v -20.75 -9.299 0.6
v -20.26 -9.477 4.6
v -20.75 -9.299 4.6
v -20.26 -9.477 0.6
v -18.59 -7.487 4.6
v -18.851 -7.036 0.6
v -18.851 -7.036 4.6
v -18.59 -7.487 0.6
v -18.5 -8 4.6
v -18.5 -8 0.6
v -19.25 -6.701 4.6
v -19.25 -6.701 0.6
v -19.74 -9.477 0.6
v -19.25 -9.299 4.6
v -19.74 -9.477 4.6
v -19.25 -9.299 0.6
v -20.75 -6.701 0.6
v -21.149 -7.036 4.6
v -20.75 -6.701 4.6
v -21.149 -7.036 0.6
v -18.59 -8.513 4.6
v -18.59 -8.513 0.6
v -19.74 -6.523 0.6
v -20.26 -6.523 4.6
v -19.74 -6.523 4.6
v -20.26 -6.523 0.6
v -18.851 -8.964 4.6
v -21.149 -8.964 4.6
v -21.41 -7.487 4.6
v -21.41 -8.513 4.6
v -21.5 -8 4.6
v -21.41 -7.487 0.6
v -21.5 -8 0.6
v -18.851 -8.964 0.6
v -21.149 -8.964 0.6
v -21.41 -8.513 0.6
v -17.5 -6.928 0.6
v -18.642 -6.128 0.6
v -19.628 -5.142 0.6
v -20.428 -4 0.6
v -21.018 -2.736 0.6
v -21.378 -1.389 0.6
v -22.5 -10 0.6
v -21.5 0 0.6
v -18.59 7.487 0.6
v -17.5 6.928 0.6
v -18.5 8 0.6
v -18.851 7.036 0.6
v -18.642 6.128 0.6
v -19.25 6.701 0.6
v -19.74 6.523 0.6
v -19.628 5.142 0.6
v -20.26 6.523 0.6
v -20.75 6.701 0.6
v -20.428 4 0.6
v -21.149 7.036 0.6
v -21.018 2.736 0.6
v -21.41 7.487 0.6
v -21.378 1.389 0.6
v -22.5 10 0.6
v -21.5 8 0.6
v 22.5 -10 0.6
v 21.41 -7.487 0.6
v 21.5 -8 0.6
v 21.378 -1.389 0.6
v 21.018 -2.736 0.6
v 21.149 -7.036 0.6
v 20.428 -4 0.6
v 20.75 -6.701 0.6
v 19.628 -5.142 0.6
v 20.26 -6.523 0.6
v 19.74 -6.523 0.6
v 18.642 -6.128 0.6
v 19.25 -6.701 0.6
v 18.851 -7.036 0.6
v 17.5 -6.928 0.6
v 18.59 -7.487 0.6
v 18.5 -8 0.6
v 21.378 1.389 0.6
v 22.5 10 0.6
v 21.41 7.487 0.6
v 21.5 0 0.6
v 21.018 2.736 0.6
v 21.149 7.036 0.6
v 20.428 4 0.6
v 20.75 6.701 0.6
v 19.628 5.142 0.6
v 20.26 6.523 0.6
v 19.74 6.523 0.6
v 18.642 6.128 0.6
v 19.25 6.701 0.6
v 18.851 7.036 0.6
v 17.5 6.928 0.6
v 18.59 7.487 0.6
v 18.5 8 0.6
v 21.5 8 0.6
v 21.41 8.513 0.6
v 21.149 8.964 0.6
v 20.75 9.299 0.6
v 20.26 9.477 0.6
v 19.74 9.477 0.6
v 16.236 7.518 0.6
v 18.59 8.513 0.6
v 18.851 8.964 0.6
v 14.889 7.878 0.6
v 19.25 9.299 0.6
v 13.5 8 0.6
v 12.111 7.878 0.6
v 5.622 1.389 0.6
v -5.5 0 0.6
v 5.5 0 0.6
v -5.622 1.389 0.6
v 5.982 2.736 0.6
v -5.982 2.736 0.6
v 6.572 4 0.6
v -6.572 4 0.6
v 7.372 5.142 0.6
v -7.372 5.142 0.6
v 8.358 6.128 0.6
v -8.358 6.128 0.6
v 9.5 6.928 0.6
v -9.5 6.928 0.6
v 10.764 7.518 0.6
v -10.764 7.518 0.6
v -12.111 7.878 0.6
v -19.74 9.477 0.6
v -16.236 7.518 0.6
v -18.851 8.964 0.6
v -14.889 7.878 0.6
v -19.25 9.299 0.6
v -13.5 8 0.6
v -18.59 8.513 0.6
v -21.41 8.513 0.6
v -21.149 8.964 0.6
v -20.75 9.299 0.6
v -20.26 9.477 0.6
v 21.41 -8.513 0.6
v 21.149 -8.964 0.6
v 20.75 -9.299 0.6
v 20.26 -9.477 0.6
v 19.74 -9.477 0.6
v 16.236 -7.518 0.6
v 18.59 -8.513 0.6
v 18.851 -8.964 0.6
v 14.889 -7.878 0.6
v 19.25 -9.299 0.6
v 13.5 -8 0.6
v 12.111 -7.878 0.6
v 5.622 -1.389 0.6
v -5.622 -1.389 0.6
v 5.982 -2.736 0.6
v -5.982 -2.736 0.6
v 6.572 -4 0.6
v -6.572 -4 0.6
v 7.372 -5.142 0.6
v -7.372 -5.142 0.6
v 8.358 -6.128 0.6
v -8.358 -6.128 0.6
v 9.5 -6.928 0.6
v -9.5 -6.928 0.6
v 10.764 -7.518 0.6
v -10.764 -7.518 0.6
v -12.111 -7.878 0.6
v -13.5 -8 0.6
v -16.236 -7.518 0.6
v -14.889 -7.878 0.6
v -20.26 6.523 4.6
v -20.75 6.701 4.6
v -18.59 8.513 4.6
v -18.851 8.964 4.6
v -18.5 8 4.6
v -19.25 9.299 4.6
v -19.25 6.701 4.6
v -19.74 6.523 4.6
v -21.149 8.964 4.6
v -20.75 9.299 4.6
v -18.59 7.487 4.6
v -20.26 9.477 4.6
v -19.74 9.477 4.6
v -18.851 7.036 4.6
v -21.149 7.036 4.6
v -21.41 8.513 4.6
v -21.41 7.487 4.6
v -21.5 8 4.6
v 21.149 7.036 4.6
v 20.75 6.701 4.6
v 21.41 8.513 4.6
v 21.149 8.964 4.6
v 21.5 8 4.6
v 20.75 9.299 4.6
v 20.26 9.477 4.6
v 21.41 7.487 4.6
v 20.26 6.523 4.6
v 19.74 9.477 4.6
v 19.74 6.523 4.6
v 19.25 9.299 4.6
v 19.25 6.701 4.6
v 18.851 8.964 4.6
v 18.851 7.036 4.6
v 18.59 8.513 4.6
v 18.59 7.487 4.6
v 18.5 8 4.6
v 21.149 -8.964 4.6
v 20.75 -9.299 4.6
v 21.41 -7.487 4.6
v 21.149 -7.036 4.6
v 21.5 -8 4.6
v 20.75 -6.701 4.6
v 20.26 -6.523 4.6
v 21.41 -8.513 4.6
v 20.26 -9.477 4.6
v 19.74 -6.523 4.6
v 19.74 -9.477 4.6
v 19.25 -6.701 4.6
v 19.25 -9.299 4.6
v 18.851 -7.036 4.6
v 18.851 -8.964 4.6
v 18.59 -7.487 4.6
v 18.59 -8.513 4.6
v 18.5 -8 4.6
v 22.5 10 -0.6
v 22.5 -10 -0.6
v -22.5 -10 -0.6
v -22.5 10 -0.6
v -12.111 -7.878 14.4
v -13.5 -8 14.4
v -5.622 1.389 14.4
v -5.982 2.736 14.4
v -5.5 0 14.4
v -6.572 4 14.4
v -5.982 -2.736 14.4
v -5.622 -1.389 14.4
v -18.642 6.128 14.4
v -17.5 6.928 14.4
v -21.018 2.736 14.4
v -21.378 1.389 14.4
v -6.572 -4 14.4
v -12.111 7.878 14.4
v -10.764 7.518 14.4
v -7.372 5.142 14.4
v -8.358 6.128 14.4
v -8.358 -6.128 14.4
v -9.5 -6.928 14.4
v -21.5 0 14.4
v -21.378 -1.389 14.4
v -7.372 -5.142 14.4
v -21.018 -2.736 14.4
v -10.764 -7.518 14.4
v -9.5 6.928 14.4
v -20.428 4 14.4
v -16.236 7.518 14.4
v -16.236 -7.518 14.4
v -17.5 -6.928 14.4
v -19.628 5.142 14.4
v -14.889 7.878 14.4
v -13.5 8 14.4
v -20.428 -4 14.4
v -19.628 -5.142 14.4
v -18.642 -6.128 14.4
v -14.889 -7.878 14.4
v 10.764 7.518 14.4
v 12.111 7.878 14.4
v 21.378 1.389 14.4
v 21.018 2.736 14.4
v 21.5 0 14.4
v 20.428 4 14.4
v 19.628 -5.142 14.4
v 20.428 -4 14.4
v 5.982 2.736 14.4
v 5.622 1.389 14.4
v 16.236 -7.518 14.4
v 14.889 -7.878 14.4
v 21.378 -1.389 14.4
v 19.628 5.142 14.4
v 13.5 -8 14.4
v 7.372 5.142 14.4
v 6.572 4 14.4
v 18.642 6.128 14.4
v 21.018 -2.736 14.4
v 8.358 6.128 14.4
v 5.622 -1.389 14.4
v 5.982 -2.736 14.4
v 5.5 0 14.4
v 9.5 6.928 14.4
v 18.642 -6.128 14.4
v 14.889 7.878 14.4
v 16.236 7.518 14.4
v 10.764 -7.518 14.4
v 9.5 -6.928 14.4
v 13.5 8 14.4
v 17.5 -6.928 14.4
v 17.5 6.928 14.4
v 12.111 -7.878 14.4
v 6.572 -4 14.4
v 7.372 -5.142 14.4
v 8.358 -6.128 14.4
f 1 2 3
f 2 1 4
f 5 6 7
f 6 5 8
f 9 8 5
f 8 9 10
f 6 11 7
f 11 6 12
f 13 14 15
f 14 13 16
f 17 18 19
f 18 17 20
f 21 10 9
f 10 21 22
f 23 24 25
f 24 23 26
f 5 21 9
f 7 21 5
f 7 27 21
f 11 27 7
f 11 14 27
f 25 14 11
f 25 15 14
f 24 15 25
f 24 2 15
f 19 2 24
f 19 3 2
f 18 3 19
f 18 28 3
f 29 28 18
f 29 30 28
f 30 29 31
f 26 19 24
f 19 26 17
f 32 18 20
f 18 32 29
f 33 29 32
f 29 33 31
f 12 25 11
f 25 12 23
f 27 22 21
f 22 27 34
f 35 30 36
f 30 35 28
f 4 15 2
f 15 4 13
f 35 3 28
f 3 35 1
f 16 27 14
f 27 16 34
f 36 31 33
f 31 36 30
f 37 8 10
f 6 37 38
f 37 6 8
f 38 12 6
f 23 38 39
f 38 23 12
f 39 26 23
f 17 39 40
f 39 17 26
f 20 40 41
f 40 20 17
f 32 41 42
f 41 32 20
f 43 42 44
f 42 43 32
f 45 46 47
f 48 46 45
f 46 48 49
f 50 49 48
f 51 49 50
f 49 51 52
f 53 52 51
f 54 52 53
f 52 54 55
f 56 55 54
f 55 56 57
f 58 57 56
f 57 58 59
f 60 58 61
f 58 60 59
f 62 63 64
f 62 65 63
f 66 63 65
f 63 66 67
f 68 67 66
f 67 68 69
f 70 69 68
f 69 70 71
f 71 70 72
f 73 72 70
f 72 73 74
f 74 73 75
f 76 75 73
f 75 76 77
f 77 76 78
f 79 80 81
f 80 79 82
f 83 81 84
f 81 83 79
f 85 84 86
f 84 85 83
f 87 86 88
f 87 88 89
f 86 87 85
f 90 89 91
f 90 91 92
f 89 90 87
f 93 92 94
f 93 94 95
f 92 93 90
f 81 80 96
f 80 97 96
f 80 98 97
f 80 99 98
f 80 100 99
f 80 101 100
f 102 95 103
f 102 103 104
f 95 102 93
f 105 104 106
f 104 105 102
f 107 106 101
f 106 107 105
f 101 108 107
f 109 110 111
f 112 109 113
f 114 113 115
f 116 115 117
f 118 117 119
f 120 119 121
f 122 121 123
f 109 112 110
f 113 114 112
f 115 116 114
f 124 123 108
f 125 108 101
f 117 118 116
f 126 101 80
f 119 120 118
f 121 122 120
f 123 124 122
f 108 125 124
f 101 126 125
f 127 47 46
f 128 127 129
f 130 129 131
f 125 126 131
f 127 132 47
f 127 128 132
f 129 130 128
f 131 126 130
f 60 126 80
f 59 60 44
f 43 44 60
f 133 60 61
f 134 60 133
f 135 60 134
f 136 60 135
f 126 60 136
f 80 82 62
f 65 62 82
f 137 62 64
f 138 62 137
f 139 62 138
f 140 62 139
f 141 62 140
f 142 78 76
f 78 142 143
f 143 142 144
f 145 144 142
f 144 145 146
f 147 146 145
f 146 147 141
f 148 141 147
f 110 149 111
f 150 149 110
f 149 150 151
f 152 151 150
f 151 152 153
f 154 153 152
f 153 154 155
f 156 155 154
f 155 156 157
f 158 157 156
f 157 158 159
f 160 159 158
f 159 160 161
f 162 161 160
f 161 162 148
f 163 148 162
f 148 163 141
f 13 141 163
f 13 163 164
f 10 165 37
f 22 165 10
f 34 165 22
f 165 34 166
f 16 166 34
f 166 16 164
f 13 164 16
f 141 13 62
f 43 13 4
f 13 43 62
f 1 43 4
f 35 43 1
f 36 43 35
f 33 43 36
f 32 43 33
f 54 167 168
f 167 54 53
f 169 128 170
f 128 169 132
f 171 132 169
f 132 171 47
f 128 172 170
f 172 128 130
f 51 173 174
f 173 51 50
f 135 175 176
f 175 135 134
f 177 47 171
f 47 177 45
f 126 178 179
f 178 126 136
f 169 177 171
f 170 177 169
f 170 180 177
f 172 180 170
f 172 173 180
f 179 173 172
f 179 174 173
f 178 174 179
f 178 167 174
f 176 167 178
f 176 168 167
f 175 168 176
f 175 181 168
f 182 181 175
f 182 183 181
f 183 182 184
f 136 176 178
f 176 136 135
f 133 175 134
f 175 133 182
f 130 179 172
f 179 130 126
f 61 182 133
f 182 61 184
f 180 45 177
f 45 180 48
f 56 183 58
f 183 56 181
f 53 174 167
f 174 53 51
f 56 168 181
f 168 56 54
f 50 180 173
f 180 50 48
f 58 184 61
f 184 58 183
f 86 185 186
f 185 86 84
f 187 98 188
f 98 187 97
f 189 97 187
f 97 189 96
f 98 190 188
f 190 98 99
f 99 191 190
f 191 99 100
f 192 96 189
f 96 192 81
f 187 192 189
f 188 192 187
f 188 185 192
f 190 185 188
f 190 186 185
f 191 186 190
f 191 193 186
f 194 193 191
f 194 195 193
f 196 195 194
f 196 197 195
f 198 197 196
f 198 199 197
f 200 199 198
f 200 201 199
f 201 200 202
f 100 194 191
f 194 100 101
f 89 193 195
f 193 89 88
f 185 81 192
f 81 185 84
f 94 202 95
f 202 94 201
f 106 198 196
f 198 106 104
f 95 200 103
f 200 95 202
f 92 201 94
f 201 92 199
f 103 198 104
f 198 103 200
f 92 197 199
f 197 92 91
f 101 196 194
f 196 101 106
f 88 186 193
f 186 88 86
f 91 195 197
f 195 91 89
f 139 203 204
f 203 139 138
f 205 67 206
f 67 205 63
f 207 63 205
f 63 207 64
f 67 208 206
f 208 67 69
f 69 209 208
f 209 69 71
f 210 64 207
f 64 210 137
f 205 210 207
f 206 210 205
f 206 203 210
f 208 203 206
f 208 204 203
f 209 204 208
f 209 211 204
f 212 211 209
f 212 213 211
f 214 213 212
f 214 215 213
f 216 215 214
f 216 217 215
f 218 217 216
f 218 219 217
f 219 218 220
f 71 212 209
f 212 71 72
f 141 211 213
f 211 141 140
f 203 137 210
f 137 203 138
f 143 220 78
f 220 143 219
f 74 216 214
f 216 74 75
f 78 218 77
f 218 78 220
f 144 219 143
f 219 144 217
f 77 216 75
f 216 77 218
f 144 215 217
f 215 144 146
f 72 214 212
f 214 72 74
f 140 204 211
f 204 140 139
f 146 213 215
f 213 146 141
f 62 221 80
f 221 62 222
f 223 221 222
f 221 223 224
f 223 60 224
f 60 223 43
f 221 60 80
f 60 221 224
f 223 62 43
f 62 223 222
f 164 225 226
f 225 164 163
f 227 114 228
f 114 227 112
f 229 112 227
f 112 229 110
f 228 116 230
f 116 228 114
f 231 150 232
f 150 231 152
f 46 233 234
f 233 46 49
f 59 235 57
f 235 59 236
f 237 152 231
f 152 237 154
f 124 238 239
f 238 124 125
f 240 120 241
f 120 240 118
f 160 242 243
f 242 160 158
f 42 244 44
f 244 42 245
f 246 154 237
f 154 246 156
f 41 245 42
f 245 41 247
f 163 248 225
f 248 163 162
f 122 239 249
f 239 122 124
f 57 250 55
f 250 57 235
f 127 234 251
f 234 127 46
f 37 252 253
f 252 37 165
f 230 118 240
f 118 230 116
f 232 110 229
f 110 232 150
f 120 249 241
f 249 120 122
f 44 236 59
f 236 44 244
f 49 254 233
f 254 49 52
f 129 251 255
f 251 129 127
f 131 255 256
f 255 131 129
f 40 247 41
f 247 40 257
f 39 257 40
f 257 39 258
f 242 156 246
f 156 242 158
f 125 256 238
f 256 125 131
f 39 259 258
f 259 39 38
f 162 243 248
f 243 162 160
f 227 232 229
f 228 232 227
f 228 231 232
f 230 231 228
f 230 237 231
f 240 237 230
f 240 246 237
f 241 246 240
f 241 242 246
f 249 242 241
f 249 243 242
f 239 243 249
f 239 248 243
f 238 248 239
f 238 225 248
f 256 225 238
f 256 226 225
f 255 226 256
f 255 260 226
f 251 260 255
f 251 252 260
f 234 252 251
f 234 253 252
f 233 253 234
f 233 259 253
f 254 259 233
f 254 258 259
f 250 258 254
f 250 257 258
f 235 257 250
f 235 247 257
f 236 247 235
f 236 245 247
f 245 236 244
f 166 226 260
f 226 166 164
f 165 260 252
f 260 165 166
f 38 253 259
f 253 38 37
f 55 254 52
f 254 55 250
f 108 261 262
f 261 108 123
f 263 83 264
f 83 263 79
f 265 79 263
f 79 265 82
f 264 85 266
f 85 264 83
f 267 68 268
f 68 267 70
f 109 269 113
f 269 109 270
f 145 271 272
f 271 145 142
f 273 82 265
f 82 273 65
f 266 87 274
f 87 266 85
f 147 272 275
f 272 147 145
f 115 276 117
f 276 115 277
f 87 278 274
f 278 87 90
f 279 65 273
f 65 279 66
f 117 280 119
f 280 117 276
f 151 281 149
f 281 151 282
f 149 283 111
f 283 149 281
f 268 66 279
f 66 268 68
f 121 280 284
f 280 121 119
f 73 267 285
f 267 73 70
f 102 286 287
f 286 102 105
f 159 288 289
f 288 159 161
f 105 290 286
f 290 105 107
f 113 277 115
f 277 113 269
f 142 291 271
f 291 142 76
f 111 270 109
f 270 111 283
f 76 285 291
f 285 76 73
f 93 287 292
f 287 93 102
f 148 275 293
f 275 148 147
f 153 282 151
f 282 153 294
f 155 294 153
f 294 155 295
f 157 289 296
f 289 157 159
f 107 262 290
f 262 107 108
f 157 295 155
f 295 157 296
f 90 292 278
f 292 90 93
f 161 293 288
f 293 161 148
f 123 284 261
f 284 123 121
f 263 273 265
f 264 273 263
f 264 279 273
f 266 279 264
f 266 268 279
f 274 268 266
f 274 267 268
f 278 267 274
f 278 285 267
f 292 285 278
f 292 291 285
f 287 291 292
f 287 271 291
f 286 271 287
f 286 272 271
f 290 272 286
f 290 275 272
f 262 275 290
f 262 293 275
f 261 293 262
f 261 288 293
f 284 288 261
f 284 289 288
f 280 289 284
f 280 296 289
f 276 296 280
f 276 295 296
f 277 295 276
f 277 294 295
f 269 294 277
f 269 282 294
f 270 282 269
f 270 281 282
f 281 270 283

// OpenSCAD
// file: ../../lib/module/module_HC_SR04.scad
//---------------------------------------------------------------
//-- Openscad HC-SR04 module
//-- (C) Juan Pedro Lopez (jotape)
//-- May-2013
//---------------------------------------------------------------
//-- Released under the GPL license
//---------------------------------------------------------------

//------------------------------------------------------------------
//-- Draw an HC-SR04 sensor module
//--
//-- Parameters:
//--  extractHoles: if true, draw the screw holes so you
//--  can extract them off another geometry, else just
//--  draw the module.
//------------------------------------------------------------------
module module_HC_SR04(extractHoles=false)
{
	// Draw the sensors
	translate(v = [-13.5, 0, 7.5]) {
		cylinder(h = 13.8, r = 8, center = true, $fn=36);
	}

	translate(v = [13.5, 0, 7.5]) {
		cylinder(h = 13.8, r = 8, center = true, $fn=36);
	}

	if (extractHoles == true) {
		union() {
			// Draw the PCB
			cube(size = [45,20,1.2], center = true);

			// Draw the screw holes
			union() {
				union() {
					translate(v = [-20, -8, 2.6]) {
						cylinder(h = 4, r = 1.5, center = true, $fn=18);
					}

					translate(v = [-20, 8, 2.6]) {
						cylinder(h = 4, r = 1.5, center = true, $fn=18);
					}
				}

				union() {
					translate(v = [20, 8, 2.6]) {
						cylinder(h = 4, r = 1.5, center = true, $fn=18);
					}

					translate(v = [20, -8, 2.6]) {
						cylinder(h = 4, r = 1.5, center = true, $fn=18);
					}
				}
			}
		}
	}
	else {
		difference() {
			// Draw the PCB
			cube(size = [45,20,1.2], center = true);

			// Draw the screw holes
			union() {
				union() {
					translate(v = [-20, -8, 0]) {
						cylinder(h = 4, r = 1.5, center = true, $fn=18);
					}

					translate(v = [-20, 8, 0]) {
						cylinder(h = 4, r = 1.5, center = true, $fn=18);
					}
				}

				union() {
					translate(v = [20, 8, 0]) {
						cylinder(h = 4, r = 1.5, center = true, $fn=18);
					}

					translate(v = [20, -8, 0]) {
						cylinder(h = 4, r = 1.5, center = true, $fn=18);
					}
				}
			}
		}
	}
}
// main file
include <../../lib/module/module_HC_SR04.scad>;

module_HC_SR04(true);
